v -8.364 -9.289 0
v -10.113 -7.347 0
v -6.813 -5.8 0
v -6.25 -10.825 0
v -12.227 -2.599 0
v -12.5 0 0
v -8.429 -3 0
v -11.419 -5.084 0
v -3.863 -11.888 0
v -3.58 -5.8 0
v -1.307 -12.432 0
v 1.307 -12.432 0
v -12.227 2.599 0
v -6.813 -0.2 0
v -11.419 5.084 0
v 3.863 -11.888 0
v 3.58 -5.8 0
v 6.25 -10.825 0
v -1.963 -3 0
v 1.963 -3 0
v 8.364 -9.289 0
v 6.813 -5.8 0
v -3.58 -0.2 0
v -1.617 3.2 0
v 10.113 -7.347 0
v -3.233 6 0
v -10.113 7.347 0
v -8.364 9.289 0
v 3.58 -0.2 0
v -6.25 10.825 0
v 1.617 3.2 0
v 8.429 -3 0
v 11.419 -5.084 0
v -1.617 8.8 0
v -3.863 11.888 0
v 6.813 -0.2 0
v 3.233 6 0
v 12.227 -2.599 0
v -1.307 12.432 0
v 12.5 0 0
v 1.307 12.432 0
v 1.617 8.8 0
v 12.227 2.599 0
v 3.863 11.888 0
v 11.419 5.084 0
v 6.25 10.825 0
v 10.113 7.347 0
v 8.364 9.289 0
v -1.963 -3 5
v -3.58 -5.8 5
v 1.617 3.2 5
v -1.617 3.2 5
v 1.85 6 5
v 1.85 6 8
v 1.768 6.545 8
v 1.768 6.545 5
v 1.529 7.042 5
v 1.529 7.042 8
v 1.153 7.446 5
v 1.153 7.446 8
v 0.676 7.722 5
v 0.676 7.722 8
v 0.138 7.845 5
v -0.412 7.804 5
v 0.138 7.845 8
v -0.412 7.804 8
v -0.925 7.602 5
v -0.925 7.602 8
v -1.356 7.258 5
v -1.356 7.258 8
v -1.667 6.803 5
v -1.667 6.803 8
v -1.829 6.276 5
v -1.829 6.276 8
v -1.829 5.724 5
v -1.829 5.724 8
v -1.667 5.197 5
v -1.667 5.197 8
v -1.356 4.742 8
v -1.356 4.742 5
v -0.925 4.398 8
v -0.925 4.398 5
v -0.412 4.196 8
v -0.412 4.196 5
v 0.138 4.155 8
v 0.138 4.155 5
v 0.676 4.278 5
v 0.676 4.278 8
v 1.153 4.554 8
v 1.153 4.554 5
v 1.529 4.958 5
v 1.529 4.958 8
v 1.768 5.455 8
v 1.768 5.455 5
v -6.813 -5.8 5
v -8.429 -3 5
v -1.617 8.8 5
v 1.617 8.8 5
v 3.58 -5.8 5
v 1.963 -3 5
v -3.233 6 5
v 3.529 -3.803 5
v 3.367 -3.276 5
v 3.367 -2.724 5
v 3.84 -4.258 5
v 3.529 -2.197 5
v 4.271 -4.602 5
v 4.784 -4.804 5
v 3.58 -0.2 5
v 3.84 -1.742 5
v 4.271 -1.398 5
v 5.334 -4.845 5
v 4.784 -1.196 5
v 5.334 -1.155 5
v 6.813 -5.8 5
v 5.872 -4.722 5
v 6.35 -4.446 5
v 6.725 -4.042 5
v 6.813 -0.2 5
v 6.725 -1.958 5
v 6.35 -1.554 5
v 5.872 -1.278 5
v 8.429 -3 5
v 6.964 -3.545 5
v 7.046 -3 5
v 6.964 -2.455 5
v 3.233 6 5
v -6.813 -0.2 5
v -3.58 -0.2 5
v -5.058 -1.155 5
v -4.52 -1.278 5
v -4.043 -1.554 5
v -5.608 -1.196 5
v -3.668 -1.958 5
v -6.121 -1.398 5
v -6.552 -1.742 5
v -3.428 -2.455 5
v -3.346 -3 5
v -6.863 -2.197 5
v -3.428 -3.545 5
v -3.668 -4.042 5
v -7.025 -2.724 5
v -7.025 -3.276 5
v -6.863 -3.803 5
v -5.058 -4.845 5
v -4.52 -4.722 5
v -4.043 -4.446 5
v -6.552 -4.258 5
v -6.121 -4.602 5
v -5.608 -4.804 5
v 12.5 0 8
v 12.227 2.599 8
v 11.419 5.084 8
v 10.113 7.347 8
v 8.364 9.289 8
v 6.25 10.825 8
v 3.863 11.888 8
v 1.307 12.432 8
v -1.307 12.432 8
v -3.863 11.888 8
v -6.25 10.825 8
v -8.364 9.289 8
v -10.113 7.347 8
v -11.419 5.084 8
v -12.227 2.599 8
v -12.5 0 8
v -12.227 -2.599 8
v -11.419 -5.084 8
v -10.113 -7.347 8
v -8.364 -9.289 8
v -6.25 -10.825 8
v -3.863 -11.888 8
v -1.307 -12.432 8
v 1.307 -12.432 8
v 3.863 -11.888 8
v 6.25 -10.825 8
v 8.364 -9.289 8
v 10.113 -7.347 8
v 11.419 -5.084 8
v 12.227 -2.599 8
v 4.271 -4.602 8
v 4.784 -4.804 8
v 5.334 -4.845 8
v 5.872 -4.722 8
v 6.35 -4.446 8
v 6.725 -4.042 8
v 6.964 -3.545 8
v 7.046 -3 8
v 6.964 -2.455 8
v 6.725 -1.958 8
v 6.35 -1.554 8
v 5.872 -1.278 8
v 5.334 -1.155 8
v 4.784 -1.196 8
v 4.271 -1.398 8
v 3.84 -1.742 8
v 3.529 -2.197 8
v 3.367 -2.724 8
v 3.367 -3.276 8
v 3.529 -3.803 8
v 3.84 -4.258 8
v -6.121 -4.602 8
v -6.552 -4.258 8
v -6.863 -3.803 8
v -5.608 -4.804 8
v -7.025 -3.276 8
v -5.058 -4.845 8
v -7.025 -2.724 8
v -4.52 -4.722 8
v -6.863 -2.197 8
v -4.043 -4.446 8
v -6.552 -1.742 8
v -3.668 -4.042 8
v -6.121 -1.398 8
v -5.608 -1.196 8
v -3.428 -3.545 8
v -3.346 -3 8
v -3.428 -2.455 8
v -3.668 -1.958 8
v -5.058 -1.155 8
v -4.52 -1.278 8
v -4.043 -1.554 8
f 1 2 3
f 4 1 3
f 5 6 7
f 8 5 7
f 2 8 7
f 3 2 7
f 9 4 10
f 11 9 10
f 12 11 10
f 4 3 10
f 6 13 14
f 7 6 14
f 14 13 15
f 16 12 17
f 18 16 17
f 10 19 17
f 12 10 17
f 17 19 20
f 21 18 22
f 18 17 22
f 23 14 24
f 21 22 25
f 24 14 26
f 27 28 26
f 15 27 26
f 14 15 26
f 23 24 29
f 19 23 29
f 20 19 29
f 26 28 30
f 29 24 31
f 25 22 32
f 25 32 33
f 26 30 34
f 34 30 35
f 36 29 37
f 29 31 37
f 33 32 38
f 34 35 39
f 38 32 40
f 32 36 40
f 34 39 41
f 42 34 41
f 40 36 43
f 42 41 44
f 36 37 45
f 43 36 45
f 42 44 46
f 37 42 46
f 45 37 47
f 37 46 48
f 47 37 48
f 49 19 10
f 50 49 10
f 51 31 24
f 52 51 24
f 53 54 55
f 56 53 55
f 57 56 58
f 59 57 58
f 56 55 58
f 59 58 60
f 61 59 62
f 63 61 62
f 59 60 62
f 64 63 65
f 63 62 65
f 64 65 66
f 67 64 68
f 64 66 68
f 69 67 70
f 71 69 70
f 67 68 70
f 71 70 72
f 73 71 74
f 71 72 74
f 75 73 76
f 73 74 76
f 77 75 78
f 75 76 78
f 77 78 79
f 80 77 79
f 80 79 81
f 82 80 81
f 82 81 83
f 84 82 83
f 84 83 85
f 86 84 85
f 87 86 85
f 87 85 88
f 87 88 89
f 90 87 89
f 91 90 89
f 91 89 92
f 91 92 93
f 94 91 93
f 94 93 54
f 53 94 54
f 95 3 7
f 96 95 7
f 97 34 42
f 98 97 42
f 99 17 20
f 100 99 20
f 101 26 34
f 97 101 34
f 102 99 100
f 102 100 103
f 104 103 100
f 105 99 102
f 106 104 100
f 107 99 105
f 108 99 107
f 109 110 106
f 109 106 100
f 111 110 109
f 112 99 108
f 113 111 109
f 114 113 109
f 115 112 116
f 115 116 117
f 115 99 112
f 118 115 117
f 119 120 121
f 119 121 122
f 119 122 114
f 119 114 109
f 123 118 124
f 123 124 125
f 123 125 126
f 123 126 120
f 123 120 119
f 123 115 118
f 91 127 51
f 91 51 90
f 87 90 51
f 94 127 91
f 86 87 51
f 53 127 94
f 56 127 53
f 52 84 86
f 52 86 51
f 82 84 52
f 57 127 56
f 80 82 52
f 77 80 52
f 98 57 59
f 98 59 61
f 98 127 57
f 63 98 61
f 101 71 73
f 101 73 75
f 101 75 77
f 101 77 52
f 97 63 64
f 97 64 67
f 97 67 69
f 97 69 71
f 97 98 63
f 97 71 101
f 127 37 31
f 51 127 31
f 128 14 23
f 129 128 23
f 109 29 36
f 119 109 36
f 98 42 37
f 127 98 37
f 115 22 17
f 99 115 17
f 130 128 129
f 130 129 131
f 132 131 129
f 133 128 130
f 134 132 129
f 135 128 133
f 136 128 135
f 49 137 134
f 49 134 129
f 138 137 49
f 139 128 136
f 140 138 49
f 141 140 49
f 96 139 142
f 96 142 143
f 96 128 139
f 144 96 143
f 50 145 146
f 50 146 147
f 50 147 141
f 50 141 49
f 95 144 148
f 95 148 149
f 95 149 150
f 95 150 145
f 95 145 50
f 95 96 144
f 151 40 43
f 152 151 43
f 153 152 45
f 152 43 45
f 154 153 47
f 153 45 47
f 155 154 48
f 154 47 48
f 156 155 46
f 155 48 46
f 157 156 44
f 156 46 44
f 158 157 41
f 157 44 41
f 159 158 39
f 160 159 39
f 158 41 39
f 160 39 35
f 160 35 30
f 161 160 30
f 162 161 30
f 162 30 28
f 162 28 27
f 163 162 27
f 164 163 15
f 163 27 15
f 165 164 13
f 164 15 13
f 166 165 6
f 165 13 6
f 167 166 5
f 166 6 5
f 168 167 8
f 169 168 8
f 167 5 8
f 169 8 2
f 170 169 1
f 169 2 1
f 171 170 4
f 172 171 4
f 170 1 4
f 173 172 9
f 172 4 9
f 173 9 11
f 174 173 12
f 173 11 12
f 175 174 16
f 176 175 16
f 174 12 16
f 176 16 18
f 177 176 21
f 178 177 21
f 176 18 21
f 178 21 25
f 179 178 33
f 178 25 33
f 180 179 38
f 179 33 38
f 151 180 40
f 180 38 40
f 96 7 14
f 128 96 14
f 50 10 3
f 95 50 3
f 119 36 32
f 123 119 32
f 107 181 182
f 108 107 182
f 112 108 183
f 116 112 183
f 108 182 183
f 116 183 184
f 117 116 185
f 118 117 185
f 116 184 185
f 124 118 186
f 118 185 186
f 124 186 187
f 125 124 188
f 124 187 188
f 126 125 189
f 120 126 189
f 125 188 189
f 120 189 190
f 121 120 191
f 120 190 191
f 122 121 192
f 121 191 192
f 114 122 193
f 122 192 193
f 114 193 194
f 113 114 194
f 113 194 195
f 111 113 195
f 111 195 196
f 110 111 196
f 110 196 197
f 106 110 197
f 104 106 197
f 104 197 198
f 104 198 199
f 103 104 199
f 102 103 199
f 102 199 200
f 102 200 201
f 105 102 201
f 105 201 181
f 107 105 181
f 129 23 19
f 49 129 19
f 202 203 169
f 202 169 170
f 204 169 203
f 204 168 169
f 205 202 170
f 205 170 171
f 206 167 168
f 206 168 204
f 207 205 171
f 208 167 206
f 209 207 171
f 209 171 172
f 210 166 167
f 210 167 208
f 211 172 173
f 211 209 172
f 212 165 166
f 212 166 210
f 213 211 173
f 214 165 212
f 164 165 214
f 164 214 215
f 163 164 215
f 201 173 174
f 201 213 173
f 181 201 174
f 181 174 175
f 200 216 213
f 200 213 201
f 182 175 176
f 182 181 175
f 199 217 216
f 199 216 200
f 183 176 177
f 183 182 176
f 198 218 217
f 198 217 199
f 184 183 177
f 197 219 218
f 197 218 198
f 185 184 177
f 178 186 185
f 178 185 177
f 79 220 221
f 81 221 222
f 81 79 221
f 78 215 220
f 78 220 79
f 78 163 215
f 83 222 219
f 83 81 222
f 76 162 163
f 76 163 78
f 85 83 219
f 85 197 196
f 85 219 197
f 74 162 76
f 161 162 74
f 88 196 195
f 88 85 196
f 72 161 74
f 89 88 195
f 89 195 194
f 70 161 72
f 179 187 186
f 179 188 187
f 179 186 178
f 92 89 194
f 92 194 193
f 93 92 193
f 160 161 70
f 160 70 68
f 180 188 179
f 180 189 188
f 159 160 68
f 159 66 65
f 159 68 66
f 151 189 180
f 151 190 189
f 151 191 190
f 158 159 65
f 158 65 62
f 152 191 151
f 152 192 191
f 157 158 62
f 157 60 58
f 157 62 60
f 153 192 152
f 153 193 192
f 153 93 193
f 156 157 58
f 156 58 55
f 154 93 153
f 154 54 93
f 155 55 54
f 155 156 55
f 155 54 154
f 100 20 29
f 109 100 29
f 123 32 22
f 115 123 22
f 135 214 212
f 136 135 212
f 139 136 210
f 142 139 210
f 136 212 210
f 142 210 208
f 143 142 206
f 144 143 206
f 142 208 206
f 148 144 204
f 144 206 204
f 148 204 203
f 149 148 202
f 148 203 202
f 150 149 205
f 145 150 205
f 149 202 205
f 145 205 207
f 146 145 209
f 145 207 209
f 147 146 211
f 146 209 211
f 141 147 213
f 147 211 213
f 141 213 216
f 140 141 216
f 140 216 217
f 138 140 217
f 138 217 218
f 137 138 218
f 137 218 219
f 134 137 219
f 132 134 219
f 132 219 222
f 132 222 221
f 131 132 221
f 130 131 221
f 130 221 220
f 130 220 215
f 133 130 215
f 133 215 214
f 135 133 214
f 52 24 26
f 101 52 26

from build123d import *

# Parameters (mm, degrees)
SKETCH1_R           = 12.5
BOSS_EXTRUDE1_DEPTH = 8
SKETCH2_R           = 1.85
CUT_EXTRUDE1_DEPTH  = 8
CUT_EXTRUDE2_DEPTH  = 5
CIRPATTERN1_COUNT   = 3


with BuildPart() as part:
    # Sketch1 → Boss-Extrude1 (new body)
    with BuildSketch(Plane.XY):
        Circle(SKETCH1_R)
    extrude(amount=BOSS_EXTRUDE1_DEPTH)

    # Sketch2 → Cut-Extrude1 (cut)
    with BuildSketch(Plane.XY.offset(8)):
        with Locations((0, 6)):
            Circle(SKETCH2_R)
    cut_extrude1 = extrude(amount=-CUT_EXTRUDE1_DEPTH, mode=Mode.SUBTRACT)

    # Sketch3 → Cut-Extrude2 (cut)
    with BuildSketch(Plane(origin=(0, 0, 0), x_dir=(-1, 0, 0), z_dir=(0, 0, -1))):
        Polygon((3.233161507, 6), (1.616580754, 8.8), (-1.616580754, 8.8), (-3.233161507, 6), (-1.616580754, 3.2), (1.616580754, 3.2), align=None)
    cut_extrude2 = extrude(amount=-CUT_EXTRUDE2_DEPTH, mode=Mode.SUBTRACT)

    # CirPattern1: Cut-Extrude1, Cut-Extrude2 ×3 about axis
    cirpattern1_axis = Axis((0, 0, 0), (0, 0, 1))
    for i in range(1, CIRPATTERN1_COUNT):
        add(cut_extrude1.rotate(cirpattern1_axis, i * 360 / CIRPATTERN1_COUNT), mode=Mode.SUBTRACT)
        add(cut_extrude2.rotate(cirpattern1_axis, i * 360 / CIRPATTERN1_COUNT), mode=Mode.SUBTRACT)


solid = part.part
